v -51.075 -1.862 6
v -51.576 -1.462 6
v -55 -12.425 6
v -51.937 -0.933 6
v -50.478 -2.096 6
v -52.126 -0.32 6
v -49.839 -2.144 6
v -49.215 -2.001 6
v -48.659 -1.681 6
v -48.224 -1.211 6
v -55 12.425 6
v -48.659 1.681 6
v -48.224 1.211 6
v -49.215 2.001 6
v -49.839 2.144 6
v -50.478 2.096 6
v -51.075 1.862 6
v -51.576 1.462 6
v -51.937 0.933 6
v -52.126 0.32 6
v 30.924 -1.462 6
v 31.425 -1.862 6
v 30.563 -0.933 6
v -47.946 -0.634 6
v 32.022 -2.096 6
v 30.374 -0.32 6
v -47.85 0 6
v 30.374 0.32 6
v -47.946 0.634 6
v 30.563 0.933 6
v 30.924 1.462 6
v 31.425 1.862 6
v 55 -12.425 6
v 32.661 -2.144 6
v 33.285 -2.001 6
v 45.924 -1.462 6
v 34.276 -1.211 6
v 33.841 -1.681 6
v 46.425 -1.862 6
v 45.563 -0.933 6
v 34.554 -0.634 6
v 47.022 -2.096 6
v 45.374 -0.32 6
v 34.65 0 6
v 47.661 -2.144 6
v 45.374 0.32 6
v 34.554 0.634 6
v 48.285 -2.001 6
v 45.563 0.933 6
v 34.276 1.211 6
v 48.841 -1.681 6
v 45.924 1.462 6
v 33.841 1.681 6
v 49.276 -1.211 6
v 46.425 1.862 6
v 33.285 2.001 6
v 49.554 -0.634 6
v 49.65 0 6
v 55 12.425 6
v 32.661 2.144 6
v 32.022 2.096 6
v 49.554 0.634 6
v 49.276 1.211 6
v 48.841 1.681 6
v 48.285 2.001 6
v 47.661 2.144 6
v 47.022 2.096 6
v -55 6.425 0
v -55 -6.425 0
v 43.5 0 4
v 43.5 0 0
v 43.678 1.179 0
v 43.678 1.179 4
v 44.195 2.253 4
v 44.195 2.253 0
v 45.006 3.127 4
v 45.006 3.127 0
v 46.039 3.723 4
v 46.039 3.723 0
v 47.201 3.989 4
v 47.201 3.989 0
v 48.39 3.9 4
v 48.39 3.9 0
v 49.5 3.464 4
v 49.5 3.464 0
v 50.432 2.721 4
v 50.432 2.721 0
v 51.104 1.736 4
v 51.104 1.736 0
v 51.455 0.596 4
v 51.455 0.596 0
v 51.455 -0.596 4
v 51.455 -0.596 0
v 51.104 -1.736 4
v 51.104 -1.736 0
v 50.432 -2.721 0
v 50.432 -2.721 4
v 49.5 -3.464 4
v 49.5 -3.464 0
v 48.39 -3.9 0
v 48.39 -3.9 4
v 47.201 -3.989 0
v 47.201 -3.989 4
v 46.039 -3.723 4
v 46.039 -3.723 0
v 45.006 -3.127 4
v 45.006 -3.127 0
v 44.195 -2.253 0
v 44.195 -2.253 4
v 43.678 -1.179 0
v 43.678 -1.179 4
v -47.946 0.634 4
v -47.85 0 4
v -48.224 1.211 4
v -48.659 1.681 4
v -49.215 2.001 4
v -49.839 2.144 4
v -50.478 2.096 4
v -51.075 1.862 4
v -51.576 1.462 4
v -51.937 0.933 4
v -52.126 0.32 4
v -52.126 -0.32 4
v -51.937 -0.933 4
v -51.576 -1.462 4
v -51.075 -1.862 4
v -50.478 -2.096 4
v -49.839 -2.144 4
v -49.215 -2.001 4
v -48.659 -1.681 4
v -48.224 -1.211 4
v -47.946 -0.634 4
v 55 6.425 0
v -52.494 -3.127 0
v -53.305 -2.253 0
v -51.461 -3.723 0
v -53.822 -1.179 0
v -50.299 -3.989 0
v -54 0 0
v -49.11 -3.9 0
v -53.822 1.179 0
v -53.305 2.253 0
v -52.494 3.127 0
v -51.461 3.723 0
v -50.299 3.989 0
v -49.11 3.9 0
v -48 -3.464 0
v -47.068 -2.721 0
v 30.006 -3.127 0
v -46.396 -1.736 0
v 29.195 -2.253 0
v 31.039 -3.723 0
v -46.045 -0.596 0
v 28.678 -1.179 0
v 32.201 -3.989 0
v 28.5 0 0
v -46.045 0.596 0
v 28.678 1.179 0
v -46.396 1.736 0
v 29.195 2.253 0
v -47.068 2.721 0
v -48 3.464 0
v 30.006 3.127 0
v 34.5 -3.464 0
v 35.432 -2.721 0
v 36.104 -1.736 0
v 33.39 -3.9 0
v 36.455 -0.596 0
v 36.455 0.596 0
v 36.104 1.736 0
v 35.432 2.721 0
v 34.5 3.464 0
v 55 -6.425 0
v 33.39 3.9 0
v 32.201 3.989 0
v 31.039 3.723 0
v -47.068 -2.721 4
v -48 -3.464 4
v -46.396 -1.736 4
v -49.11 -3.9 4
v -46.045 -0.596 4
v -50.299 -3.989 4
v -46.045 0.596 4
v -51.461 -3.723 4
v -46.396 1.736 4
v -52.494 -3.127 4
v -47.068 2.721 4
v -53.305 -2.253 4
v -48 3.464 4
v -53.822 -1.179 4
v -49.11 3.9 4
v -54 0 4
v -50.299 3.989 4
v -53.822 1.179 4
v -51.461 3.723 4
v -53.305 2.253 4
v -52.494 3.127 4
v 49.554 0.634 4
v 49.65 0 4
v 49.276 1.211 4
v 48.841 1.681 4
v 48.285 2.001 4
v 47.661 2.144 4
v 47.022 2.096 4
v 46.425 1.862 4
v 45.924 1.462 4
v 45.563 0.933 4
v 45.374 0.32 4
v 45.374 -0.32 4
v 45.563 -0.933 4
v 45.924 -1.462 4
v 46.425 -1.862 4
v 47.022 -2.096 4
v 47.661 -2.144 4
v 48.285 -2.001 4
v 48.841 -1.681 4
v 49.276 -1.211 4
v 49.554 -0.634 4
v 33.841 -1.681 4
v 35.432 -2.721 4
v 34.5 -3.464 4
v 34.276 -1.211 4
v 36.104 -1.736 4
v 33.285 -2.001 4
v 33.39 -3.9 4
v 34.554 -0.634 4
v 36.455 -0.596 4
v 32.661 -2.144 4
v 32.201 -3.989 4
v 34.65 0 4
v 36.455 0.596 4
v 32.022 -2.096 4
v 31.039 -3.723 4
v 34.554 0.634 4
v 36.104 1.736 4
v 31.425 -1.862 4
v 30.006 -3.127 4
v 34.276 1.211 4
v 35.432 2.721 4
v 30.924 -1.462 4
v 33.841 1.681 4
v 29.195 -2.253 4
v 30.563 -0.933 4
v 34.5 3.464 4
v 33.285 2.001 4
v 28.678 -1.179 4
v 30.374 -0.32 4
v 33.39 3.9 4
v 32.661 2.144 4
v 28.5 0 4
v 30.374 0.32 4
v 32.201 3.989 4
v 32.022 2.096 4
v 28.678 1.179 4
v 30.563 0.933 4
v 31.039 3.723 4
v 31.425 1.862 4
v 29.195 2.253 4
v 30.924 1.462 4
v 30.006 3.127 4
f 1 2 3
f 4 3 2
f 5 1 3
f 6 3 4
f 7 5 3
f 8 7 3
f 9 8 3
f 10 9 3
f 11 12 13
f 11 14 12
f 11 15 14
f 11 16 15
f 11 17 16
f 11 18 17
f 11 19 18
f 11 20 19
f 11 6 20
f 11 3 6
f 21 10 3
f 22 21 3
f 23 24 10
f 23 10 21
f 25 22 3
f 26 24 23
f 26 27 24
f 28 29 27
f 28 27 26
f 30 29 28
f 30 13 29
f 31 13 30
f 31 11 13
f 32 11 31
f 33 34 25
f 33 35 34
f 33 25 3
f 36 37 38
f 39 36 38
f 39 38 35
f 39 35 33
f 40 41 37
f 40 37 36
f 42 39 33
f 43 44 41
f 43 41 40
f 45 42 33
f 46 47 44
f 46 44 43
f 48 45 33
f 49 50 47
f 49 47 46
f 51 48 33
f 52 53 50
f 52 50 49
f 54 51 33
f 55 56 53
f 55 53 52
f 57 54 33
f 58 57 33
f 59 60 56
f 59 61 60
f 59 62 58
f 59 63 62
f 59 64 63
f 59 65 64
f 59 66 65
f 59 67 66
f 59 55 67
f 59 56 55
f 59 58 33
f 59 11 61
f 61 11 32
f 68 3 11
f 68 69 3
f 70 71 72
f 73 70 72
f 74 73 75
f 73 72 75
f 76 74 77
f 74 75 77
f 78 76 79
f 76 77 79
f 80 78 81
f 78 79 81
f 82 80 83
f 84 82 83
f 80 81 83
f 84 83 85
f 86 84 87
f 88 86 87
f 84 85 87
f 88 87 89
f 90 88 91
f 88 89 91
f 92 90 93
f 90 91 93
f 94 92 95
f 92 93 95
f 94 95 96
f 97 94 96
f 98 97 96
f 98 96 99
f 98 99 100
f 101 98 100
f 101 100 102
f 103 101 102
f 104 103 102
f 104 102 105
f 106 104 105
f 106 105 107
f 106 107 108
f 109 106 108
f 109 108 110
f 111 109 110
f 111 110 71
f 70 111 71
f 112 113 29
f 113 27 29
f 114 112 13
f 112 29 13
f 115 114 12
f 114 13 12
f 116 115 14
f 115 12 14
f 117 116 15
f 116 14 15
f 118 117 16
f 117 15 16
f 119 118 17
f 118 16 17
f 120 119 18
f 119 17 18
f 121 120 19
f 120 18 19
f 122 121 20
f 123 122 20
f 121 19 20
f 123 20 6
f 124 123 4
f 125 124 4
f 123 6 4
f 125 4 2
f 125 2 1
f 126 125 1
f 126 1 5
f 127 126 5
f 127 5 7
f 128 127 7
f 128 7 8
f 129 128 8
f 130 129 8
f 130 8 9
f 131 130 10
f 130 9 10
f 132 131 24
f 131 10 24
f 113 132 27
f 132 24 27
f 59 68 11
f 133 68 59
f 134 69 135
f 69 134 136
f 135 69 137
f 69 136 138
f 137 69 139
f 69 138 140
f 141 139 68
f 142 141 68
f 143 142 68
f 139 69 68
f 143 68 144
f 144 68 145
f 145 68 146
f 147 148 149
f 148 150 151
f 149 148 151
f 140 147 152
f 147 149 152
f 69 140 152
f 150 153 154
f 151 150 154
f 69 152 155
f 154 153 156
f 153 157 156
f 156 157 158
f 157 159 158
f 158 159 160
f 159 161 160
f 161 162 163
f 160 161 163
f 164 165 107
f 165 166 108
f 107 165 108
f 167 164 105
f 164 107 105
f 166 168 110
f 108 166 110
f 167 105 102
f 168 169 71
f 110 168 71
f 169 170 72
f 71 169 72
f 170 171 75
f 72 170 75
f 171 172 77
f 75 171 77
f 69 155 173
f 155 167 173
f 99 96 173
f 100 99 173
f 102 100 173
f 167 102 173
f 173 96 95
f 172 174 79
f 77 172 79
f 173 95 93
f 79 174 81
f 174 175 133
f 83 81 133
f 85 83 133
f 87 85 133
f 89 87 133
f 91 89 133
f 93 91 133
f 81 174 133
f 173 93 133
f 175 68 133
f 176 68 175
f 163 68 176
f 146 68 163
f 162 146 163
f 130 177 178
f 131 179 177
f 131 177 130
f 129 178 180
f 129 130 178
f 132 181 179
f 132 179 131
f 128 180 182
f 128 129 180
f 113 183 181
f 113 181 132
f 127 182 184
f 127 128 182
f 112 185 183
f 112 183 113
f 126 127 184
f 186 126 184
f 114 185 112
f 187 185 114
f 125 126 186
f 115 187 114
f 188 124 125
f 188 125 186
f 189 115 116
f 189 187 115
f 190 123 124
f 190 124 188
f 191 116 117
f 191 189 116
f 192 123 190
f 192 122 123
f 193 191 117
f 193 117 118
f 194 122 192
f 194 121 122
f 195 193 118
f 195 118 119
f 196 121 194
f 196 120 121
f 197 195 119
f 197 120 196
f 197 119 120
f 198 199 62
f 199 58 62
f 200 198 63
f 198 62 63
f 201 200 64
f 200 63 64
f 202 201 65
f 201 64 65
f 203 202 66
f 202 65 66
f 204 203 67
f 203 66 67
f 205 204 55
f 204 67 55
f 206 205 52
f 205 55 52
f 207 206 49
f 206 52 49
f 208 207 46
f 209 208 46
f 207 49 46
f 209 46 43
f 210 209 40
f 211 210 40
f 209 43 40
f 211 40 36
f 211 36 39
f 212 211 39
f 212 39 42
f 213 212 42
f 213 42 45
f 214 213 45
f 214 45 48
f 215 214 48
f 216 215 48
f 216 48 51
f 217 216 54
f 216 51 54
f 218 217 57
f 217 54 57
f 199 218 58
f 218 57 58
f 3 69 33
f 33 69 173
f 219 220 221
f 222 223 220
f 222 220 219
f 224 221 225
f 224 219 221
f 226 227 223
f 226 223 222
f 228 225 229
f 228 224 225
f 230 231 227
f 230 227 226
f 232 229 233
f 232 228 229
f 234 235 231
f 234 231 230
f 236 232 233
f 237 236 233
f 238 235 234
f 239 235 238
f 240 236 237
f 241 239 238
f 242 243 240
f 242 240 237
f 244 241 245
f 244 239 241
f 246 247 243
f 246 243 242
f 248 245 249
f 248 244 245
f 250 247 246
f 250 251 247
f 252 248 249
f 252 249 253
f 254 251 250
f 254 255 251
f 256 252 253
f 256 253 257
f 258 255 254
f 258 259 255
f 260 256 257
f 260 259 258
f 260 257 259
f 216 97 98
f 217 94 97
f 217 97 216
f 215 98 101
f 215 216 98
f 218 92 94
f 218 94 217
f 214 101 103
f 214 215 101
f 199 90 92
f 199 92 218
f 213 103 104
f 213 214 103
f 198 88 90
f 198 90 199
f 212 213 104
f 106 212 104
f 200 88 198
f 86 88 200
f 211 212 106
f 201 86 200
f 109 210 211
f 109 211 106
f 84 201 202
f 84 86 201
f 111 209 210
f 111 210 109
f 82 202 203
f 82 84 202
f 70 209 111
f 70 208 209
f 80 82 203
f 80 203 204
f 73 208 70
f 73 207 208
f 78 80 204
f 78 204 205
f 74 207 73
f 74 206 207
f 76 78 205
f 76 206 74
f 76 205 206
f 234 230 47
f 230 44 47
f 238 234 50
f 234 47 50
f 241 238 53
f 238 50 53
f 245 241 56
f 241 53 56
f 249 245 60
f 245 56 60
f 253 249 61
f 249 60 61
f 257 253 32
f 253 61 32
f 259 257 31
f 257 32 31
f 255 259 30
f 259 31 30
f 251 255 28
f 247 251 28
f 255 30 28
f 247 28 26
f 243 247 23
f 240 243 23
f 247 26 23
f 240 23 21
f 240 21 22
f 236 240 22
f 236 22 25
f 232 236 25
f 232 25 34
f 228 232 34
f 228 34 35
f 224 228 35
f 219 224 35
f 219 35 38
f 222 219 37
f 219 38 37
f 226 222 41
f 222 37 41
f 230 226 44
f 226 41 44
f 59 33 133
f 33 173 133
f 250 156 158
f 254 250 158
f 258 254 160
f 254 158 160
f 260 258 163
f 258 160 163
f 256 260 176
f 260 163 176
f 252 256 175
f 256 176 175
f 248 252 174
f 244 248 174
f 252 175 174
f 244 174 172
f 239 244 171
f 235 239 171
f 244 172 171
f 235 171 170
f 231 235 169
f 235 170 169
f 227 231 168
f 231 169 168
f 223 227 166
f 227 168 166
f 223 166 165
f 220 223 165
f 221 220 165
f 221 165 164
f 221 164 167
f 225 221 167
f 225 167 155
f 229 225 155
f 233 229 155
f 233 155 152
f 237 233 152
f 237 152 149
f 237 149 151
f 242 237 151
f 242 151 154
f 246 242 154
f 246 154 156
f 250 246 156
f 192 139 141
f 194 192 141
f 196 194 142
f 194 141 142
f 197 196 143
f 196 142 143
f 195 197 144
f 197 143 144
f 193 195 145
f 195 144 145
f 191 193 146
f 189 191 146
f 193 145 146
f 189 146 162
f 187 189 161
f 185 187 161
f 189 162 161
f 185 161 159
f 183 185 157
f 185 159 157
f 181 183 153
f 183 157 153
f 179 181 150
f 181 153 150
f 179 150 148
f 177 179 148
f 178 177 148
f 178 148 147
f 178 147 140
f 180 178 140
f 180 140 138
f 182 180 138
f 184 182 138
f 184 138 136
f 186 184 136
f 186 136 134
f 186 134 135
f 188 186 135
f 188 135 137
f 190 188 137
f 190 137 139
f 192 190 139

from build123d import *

# Parameters (mm, degrees)
SKETCH1_W                      = 110
SKETCH1_H                      = 24.85
BOSS_EXTRUDE1_DEPTH            = 6
CHAMFER1_SIZE                  = 6
CBORE_FOR_M4_SHCS1_D           = 4.3
CBORE_FOR_M4_SHCS1_DEPTH       = 10.1
CBORE_FOR_M4_SHCS1_CBORE_D     = 8
CBORE_FOR_M4_SHCS1_CBORE_DEPTH = 4
CBORE_FOR_M4_SHCS1_TIP         = 1.291850331


with BuildPart() as part:
    # Sketch1 → Boss-Extrude1 (new body)
    with BuildSketch(Plane.XY):
        Rectangle(SKETCH1_W, SKETCH1_H)
    extrude(amount=BOSS_EXTRUDE1_DEPTH)

    # Chamfer1
    chamfer1_edges = [part.edges().sort_by_distance(p)[0] for p in [
        (0, -12.425, 0),
        (0, 12.425, 0),
    ]]
    chamfer(chamfer1_edges, length=CHAMFER1_SIZE - 0.0001)  # a hair under: the kernel refuses the full size

    # CBORE for M4 SHCS1
    with Locations(Plane(origin=(0, 0, 0), x_dir=(-1, 0, 0), z_dir=(0, 0, -1))):
        with Locations((-47.5, 0), (-32.5, 0), (50, 0)):
            CounterBoreHole(CBORE_FOR_M4_SHCS1_D / 2, CBORE_FOR_M4_SHCS1_CBORE_D / 2, CBORE_FOR_M4_SHCS1_CBORE_DEPTH, depth=CBORE_FOR_M4_SHCS1_DEPTH)
            with Locations((0, 0, -(CBORE_FOR_M4_SHCS1_DEPTH + CBORE_FOR_M4_SHCS1_TIP / 2))):  # 118° drill point
                Cone(0, CBORE_FOR_M4_SHCS1_D / 2, CBORE_FOR_M4_SHCS1_TIP, mode=Mode.SUBTRACT)


solid = part.part
